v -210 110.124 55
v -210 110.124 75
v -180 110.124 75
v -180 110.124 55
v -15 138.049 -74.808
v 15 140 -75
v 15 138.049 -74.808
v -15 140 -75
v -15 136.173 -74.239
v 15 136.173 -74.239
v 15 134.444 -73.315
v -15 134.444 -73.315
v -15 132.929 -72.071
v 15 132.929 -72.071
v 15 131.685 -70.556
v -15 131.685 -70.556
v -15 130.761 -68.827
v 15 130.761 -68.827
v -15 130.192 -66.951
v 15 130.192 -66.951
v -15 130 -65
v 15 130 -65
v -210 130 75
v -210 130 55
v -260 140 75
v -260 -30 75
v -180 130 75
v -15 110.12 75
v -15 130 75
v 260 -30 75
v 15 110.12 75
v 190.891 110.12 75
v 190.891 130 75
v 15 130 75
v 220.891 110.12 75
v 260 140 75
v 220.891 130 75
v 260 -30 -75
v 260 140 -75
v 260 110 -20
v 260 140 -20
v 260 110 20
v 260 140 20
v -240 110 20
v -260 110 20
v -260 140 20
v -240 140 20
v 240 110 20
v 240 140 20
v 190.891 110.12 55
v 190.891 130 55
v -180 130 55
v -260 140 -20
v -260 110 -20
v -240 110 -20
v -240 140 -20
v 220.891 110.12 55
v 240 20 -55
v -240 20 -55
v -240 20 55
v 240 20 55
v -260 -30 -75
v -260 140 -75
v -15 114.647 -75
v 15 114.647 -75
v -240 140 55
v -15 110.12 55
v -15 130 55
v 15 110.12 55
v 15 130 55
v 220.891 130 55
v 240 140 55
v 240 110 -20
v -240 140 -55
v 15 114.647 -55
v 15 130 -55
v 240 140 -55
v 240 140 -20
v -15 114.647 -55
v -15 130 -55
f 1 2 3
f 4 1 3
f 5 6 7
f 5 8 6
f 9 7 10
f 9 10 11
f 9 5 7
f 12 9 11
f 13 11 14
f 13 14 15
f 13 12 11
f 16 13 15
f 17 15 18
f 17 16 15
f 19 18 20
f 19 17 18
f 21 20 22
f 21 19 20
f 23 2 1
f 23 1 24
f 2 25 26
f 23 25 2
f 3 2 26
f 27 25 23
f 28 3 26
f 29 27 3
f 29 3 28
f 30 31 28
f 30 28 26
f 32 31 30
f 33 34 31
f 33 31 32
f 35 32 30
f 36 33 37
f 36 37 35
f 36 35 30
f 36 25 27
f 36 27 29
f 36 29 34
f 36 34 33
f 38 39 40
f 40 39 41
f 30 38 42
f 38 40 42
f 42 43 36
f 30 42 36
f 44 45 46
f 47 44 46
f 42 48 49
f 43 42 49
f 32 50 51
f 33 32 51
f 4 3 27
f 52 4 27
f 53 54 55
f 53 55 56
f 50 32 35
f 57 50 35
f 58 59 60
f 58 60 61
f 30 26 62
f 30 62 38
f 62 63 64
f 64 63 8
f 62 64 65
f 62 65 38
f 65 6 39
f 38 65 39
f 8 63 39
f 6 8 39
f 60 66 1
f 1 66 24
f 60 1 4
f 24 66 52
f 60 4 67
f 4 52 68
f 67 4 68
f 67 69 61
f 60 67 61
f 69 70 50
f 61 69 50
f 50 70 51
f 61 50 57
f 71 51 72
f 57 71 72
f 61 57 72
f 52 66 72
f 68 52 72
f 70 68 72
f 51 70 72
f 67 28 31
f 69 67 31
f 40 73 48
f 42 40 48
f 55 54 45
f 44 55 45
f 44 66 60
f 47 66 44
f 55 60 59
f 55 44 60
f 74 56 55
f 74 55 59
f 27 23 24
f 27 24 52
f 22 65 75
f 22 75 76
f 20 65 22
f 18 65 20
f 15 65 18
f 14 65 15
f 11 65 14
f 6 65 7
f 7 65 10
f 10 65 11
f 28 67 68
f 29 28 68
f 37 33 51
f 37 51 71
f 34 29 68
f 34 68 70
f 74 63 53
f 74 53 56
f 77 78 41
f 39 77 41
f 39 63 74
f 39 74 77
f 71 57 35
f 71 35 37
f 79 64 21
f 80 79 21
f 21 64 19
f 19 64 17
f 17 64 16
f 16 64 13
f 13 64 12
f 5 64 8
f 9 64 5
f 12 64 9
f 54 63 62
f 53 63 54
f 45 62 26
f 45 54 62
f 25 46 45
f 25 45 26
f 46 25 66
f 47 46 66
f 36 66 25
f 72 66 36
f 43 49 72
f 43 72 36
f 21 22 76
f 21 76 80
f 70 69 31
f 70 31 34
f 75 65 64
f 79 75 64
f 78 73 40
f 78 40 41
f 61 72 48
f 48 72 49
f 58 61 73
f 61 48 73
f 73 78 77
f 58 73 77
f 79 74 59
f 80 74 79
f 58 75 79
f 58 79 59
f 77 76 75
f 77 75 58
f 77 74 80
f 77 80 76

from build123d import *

# Parameters (mm, degrees)
SKETCH_1_W           = 520
SKETCH_1_H           = 150
EXTRUDE_1_DEPTH      = 140
SKETCH_2_W           = 480
SKETCH_2_H           = 110
CUT_EXTRUDE_1_DEPTH  = 120
SKETCH_11_W          = 40
SKETCH_11_H          = 30
CUT_EXTRUDE_3_DEPTH  = 544.714079273
SKETCH_13_W          = 520
SKETCH_13_H          = 150
EXTRUDE_6_DEPTH      = 30
SKETCH_18_W          = 30
SKETCH_18_H          = 15.352958973
CUT_EXTRUDE_8_DEPTH  = 30
FILLET_1_R           = 10
SKETCH_21_W          = 30
SKETCH_21_H          = 19.875616275
CUT_EXTRUDE_9_DEPTH  = 30
SKETCH_22_W          = 30
SKETCH_22_H          = 19.88
CUT_EXTRUDE_10_DEPTH = 30
SKETCH_25_W          = 30
SKETCH_25_H          = 19.88
CUT_EXTRUDE_12_DEPTH = 30


with BuildPart() as part:
    # 草圖1 → 填料-伸長1 (new body)
    with BuildSketch(Plane(origin=(0, 0, 0), x_dir=(1, 0, 0), z_dir=(0, 1, 0))):
        Rectangle(SKETCH_1_W, SKETCH_1_H)
    extrude(amount=EXTRUDE_1_DEPTH)

    # 草圖2 → 除料-伸長1 (cut)
    with BuildSketch(Plane(origin=(0, 140, 0), x_dir=(1, 0, 0), z_dir=(0, 1, 0))):
        Rectangle(SKETCH_2_W, SKETCH_2_H)
    extrude(amount=-CUT_EXTRUDE_1_DEPTH, mode=Mode.SUBTRACT)

    # 草圖11 → 除料-伸長3 (cut, through all)
    with BuildSketch(Plane.ZY.offset(260)):
        with Locations((0, 125)):
            Rectangle(SKETCH_11_W, SKETCH_11_H)
    extrude(amount=-CUT_EXTRUDE_3_DEPTH, mode=Mode.SUBTRACT)

    # 草圖13 → 填料-伸長6 (add)
    with BuildSketch(Plane.XZ):
        Rectangle(SKETCH_13_W, SKETCH_13_H)
    extrude(amount=EXTRUDE_6_DEPTH)

    # 草圖18 → 除料-伸長8 (cut)
    with BuildSketch(Plane(origin=(0, 0, -75), x_dir=(-1, 0, 0), z_dir=(0, 0, -1))):
        with Locations((0, 122.323520514)):
            Rectangle(SKETCH_18_W, SKETCH_18_H)
    extrude(amount=-CUT_EXTRUDE_8_DEPTH, mode=Mode.SUBTRACT)

    # 圓角1
    fillet_1_edges = [part.edges().sort_by_distance(p)[0] for p in [
        (0, 130, -75),
    ]]
    fillet(fillet_1_edges, radius=FILLET_1_R - 0.0001)  # a hair under: the kernel refuses the full size

    # 草圖21 → 除料-伸長9 (cut)
    with BuildSketch(Plane.XY.offset(75)):
        with Locations((-195, 120.062191863)):
            Rectangle(SKETCH_21_W, SKETCH_21_H)
    extrude(amount=-CUT_EXTRUDE_9_DEPTH, mode=Mode.SUBTRACT)

    # 草圖22 → 除料-伸長10 (cut)
    with BuildSketch(Plane.XY.offset(75)):
        with Locations((0, 120.06)):
            Rectangle(SKETCH_22_W, SKETCH_22_H)
    extrude(amount=-CUT_EXTRUDE_10_DEPTH, mode=Mode.SUBTRACT)

    # 草圖25 → 除料-伸長12 (cut)
    with BuildSketch(Plane.XY.offset(75)):
        with Locations((205.891066665, 120.06)):
            Rectangle(SKETCH_25_W, SKETCH_25_H)
    extrude(amount=-CUT_EXTRUDE_12_DEPTH, mode=Mode.SUBTRACT)


solid = part.part
